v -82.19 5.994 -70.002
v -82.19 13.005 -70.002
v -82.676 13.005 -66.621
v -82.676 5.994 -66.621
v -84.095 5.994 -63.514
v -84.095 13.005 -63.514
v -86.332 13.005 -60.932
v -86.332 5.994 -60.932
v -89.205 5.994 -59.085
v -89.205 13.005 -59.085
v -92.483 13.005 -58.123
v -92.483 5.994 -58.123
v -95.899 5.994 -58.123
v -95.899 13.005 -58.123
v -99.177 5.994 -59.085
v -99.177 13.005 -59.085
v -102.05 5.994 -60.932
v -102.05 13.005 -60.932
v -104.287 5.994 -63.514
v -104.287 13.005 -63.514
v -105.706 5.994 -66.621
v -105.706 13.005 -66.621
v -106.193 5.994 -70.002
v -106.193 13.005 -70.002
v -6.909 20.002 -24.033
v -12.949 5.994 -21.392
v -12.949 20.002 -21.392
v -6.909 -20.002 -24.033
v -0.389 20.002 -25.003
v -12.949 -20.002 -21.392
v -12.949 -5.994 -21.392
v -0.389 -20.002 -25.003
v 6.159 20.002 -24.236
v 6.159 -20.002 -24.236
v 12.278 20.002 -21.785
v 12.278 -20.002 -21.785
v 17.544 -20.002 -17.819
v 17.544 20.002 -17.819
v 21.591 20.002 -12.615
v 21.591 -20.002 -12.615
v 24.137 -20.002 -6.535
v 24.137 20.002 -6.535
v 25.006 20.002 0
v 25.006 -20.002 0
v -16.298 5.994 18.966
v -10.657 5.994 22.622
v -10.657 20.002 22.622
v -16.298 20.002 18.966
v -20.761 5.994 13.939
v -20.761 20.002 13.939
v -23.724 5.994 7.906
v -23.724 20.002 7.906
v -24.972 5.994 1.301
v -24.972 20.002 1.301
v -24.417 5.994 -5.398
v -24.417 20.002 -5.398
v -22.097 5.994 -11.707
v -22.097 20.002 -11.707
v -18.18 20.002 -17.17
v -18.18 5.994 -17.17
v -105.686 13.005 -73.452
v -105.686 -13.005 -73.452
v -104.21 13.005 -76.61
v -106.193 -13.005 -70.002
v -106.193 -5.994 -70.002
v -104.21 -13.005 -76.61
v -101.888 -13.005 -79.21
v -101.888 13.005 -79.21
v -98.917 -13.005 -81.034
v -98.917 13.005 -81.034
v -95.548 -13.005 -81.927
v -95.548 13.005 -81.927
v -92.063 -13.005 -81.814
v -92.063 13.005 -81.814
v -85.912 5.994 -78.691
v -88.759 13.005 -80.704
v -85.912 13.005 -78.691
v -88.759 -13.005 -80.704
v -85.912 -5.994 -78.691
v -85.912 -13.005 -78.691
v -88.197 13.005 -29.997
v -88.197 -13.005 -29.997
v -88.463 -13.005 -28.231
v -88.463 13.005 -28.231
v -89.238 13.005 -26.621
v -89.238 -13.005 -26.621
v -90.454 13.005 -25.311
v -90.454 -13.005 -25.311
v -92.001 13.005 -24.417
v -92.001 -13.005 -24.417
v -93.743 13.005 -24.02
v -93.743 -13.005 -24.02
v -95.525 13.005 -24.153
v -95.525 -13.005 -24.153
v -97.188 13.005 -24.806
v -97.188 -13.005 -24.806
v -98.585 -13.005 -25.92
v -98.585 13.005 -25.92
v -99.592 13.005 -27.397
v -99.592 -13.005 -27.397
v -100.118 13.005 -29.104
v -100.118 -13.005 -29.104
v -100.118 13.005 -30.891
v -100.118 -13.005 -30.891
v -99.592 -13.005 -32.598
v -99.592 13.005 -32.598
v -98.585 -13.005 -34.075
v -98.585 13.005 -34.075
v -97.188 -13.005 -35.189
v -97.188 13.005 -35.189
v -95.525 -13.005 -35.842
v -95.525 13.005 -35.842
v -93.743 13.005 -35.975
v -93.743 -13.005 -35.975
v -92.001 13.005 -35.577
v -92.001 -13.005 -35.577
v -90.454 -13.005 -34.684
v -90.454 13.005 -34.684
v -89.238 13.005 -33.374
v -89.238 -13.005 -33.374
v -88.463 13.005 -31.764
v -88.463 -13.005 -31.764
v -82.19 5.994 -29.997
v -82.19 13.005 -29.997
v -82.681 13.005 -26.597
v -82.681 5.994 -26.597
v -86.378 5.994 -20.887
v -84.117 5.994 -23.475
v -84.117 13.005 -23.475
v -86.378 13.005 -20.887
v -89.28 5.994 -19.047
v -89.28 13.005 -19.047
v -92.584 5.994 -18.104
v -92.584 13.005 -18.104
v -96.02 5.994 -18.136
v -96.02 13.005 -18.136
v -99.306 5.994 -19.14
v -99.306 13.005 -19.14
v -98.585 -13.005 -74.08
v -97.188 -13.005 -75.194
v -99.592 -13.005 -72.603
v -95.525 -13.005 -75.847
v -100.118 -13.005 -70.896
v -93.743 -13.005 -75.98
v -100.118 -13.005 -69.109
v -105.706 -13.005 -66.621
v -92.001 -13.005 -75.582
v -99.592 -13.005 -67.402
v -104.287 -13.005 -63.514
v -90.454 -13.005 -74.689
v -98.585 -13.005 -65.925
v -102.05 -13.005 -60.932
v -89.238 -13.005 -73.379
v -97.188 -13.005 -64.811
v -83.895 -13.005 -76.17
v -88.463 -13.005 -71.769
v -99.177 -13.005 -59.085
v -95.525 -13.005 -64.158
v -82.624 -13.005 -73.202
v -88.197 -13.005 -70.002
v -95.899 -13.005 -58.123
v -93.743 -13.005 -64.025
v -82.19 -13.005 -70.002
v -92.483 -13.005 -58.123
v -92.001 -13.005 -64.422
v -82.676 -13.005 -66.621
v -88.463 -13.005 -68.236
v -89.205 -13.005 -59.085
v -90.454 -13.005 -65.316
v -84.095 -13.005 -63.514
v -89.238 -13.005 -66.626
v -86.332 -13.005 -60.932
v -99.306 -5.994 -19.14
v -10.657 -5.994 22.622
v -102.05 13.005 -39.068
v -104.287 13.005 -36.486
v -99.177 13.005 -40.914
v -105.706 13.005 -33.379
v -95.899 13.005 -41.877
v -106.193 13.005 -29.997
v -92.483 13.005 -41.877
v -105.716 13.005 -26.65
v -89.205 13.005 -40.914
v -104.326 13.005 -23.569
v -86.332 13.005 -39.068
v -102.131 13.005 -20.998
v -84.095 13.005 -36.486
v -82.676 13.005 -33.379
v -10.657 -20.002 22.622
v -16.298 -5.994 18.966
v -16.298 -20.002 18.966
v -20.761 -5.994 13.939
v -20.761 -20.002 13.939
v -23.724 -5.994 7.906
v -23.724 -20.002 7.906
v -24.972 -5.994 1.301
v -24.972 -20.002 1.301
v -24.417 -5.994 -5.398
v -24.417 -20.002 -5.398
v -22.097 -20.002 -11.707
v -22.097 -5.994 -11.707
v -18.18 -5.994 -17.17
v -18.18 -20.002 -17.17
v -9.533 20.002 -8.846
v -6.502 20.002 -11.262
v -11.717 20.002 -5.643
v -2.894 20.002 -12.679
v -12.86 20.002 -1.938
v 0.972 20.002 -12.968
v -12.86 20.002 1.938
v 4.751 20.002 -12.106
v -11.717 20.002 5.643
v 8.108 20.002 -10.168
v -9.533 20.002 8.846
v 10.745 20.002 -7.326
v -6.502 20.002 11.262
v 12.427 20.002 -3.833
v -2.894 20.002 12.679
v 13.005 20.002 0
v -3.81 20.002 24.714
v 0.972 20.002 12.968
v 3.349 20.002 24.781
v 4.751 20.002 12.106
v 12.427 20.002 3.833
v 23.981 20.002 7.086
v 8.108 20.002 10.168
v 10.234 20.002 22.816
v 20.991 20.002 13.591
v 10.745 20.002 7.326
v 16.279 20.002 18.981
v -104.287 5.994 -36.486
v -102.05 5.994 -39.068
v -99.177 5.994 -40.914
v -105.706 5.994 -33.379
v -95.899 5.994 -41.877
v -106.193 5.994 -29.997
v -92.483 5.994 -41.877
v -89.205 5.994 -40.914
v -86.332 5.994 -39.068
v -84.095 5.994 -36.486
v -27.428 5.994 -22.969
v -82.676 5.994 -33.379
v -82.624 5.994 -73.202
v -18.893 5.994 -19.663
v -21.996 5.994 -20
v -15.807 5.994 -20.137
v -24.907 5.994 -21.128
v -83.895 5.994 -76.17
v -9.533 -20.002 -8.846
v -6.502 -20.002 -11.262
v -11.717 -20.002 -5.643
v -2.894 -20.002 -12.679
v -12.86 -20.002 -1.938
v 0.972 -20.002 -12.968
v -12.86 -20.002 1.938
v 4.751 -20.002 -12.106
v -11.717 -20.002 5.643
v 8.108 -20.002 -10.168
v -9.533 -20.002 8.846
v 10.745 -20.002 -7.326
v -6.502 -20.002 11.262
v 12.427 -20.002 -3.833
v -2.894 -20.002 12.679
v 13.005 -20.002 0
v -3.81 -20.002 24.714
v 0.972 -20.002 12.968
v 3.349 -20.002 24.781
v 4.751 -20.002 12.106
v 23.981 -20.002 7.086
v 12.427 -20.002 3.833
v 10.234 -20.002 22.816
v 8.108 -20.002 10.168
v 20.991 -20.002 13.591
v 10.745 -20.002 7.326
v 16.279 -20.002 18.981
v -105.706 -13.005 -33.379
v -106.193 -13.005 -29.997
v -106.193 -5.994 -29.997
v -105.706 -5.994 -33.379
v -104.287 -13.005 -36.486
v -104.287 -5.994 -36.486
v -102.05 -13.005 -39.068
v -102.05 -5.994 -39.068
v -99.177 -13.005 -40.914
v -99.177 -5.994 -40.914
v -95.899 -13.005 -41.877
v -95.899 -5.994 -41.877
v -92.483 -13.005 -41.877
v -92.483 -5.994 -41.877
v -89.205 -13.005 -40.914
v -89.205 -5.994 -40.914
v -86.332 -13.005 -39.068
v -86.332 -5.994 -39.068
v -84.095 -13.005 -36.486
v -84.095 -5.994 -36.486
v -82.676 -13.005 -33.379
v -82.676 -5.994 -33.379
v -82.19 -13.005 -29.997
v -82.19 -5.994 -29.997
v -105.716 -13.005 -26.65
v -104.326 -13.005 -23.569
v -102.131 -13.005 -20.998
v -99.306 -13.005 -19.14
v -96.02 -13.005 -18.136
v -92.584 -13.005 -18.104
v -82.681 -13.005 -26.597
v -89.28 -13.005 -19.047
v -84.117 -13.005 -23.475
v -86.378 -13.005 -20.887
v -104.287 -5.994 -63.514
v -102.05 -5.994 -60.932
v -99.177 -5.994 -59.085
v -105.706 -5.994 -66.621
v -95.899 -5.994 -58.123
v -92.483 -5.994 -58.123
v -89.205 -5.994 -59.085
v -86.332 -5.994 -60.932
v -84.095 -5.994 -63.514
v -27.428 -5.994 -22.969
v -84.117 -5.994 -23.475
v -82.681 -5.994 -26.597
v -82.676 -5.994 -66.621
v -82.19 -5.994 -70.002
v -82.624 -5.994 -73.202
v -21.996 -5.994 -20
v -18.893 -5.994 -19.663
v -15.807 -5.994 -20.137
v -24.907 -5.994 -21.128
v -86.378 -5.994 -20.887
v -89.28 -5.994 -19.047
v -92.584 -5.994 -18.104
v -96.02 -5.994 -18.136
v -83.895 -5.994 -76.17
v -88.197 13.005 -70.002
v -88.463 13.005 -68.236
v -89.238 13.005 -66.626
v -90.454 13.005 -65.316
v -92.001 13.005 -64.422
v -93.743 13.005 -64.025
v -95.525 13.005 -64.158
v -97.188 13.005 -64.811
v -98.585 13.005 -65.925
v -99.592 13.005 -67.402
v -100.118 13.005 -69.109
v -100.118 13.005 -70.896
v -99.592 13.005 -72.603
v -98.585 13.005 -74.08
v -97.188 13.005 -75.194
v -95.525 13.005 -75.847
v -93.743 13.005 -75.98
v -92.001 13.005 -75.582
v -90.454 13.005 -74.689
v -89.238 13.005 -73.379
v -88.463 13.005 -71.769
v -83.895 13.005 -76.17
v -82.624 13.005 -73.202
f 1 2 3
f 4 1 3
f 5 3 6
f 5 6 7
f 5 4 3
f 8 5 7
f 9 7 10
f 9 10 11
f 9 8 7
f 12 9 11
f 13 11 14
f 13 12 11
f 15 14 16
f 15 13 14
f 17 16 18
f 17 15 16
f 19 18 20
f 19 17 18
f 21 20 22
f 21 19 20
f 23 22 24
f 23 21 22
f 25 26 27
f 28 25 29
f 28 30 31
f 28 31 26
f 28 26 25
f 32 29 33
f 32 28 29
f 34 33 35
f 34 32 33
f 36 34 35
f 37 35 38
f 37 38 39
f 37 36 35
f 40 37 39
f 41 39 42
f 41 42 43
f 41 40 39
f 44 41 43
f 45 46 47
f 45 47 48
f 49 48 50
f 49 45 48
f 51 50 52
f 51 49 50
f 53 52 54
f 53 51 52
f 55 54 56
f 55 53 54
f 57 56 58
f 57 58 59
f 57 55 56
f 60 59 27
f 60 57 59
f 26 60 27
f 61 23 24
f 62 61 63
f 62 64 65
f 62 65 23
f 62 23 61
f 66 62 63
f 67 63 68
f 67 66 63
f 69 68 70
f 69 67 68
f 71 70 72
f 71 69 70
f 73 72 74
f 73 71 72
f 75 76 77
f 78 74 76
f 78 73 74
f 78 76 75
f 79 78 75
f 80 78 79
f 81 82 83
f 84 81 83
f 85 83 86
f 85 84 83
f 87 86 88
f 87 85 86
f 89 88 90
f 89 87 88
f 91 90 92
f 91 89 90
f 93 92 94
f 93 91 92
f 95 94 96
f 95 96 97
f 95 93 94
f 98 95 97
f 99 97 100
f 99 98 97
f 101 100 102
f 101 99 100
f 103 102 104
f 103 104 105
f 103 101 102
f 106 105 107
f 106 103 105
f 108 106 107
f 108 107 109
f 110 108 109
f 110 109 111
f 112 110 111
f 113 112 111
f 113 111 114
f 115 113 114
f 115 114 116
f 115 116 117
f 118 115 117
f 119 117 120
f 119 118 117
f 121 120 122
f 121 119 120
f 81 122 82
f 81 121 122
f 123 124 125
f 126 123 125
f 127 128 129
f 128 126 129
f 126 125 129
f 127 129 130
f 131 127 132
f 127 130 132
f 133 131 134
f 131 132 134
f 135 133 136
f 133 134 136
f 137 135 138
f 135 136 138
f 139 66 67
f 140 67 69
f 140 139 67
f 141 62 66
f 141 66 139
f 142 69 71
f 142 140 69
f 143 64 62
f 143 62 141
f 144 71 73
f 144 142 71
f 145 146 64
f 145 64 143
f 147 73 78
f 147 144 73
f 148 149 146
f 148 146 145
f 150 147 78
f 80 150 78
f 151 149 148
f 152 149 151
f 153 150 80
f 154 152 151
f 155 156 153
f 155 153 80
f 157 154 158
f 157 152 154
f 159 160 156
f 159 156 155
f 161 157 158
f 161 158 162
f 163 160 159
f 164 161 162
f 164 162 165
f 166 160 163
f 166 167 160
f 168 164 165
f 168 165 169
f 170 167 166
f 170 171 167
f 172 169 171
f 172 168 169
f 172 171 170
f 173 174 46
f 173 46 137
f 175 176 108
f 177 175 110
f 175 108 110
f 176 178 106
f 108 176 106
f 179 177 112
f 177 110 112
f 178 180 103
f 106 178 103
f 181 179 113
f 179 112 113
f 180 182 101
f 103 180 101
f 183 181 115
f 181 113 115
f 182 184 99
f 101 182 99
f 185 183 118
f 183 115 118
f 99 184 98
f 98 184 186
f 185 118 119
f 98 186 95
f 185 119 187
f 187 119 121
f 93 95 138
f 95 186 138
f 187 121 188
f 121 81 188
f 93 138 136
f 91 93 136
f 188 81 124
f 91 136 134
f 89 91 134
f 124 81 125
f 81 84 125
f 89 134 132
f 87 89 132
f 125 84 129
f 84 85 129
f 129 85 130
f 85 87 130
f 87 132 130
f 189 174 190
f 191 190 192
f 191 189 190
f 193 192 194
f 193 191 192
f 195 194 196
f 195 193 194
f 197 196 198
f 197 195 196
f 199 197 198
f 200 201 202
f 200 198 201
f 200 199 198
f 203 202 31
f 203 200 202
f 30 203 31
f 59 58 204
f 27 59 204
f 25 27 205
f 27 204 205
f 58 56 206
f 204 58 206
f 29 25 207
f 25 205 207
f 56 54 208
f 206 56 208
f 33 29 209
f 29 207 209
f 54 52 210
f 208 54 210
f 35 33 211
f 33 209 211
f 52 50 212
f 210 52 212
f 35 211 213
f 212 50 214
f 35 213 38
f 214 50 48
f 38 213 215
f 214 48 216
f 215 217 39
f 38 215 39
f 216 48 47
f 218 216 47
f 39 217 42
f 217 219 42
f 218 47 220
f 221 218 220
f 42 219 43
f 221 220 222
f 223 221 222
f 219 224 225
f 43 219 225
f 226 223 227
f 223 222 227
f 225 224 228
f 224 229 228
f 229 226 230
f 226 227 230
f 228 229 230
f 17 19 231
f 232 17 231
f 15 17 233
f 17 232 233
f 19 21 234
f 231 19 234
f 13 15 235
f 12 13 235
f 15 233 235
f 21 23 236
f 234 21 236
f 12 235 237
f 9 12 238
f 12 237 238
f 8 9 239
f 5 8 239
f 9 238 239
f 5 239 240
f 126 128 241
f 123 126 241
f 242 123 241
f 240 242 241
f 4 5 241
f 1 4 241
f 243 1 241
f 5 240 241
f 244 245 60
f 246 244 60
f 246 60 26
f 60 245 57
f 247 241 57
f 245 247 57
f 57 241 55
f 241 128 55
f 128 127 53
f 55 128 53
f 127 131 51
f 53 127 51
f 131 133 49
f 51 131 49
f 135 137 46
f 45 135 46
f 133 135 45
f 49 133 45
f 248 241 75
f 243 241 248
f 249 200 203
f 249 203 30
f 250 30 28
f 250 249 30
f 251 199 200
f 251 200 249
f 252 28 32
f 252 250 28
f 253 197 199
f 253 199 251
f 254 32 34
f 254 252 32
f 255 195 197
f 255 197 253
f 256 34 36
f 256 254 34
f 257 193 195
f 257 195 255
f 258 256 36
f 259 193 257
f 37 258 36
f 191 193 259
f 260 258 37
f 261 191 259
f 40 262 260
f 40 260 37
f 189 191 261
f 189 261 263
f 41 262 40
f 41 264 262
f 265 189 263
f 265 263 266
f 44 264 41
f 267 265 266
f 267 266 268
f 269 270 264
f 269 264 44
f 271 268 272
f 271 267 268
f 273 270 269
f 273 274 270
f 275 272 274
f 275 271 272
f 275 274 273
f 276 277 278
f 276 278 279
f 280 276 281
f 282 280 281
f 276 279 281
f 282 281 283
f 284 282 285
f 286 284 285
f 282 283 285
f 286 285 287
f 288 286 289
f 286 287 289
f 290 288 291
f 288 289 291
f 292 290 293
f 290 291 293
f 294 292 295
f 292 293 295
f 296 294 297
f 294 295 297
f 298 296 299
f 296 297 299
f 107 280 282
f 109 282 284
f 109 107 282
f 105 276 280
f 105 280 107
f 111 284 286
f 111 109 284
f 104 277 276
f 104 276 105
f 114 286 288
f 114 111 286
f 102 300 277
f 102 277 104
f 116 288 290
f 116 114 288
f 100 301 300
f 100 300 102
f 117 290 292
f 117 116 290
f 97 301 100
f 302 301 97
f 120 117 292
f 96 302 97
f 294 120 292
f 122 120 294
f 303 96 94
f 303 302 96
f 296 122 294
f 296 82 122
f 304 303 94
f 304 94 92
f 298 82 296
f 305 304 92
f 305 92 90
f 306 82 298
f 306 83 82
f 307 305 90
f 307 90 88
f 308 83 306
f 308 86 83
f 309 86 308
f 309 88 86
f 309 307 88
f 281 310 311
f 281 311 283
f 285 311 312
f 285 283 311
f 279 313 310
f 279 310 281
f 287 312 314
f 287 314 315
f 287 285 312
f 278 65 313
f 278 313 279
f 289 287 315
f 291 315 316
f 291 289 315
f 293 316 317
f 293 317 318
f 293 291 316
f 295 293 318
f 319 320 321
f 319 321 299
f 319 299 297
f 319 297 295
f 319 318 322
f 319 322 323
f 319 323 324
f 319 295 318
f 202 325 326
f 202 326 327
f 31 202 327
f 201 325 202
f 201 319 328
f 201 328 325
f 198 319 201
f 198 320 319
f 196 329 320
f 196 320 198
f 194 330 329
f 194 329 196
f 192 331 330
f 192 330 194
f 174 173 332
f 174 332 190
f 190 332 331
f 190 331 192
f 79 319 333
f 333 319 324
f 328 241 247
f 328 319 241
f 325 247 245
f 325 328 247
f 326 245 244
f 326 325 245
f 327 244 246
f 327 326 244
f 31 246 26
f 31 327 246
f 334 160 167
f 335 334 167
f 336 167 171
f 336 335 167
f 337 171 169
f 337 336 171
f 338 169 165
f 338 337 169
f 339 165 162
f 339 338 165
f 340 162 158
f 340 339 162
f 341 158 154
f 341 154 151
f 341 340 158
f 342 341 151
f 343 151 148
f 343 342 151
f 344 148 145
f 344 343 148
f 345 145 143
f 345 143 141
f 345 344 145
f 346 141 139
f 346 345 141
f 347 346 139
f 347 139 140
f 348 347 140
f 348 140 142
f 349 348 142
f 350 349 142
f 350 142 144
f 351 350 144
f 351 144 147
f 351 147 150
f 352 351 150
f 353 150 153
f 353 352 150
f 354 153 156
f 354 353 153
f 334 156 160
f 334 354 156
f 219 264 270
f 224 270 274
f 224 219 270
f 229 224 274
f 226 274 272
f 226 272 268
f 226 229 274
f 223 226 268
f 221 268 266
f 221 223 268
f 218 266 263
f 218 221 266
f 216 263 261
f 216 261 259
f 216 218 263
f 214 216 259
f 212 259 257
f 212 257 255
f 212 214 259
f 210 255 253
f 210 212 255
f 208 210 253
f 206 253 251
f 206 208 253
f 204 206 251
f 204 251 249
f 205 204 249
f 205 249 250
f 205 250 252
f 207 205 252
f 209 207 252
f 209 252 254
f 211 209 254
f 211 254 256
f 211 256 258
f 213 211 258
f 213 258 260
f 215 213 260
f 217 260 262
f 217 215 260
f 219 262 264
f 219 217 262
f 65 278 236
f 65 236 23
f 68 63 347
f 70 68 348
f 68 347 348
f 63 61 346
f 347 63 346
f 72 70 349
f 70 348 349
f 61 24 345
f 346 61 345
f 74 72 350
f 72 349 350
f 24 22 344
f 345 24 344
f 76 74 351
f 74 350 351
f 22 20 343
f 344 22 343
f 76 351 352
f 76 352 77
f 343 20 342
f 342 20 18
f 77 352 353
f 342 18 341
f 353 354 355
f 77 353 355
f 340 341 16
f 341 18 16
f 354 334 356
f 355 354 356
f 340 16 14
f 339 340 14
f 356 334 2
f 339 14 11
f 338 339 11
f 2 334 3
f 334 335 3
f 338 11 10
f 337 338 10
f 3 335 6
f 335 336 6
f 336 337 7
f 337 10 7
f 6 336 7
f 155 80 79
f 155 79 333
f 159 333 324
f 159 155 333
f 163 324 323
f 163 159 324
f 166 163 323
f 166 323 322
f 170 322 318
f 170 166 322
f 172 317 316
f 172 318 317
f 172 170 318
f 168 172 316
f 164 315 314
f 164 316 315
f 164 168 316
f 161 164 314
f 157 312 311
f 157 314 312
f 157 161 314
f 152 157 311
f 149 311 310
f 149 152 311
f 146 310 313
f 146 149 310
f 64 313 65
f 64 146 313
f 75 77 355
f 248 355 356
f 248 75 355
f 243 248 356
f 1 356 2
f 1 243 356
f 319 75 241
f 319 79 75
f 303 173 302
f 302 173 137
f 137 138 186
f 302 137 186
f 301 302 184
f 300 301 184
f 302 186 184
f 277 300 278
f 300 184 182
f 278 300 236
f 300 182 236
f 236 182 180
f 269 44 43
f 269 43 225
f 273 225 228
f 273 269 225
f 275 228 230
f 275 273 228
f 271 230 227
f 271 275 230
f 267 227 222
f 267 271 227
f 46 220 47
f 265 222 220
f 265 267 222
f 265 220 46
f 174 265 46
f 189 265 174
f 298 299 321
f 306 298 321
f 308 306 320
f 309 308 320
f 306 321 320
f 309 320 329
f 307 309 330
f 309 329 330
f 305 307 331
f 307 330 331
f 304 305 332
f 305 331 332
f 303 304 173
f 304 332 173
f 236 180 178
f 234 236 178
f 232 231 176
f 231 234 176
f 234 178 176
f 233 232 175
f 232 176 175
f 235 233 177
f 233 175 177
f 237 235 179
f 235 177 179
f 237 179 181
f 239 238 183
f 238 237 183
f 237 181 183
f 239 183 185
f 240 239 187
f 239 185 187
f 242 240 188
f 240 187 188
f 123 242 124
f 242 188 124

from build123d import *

# Parameters (mm, degrees)
F0_R     = 13.0048
F1_DEPTH = 20.0025
F2_DEPTH = 5.9944
F0_R_2   = 5.9944
F3_DEPTH = 13.0048


with BuildPart() as f1:
    # F0 (on Front) → F1 (new body, symmetric)
    with BuildSketch(Plane.XZ):
        with BuildLine():
            ThreePointArc((-12.949346, -21.392276), (12.278025, -21.784516), (25.0063, 0))
            ThreePointArc((25.0063, 0), (13.394448, 21.116434), (-10.657017, 22.621738))
            ThreePointArc((-10.657017, 22.621738), (-24.972454, 1.300611), (-12.949346, -21.392276))
        make_face()
        Circle(F0_R, mode=Mode.SUBTRACT)
    extrude(amount=F1_DEPTH, both=True)

    # F0 (on Front) → F2 (join, symmetric)
    with BuildSketch(Plane.XZ):
        with BuildLine():
            ThreePointArc((-12.949346, -21.392276), (-24.972454, 1.300611), (-10.657017, 22.621738))
            Line((-10.657017, 22.621738), (-99.305738, -19.140344))
            ThreePointArc((-99.305738, -19.140344), (-87.7625, -19.862798), (-82.189519, -29.9974))
            ThreePointArc((-82.189519, -29.9974), (-94.191019, -41.9989), (-106.192519, -29.9974))
            Line((-106.192519, -29.9974), (-106.192519, -70.0024))
            ThreePointArc((-106.192519, -70.0024), (-94.191019, -58.0009), (-82.189519, -70.0024))
            ThreePointArc((-82.189519, -70.0024), (-83.15941, -74.728879), (-85.912321, -78.691425))
            Line((-85.912321, -78.691425), (-27.427604, -22.968569))
            ThreePointArc((-27.427604, -22.968569), (-20.455258, -19.730028), (-12.949346, -21.392276))
        make_face()
    extrude(amount=F2_DEPTH, both=True)

    # F0 (on Front) → F3 (join, symmetric)
    with BuildSketch(Plane.XZ):
        with BuildLine():
            ThreePointArc((-82.189519, -29.9974), (-87.7625, -19.862798), (-99.305738, -19.140344))
            ThreePointArc((-99.305738, -19.140344), (-104.325621, -23.568881), (-106.192519, -29.9974))
            ThreePointArc((-106.192519, -29.9974), (-94.191019, -41.9989), (-82.189519, -29.9974))
        make_face()
        with Locations((-94.191019, -29.9974)):
            Circle(F0_R_2, mode=Mode.SUBTRACT)
        with BuildLine():
            ThreePointArc((-106.192519, -70.0024), (-98.917498, -81.034009), (-85.912321, -78.691425))
            ThreePointArc((-85.912321, -78.691425), (-83.15941, -74.728879), (-82.189519, -70.0024))
            ThreePointArc((-82.189519, -70.0024), (-94.191019, -58.0009), (-106.192519, -70.0024))
        make_face()
        with Locations((-94.191019, -70.0024)):
            Circle(F0_R_2, mode=Mode.SUBTRACT)
    extrude(amount=F3_DEPTH, both=True)


solid = f1.part
